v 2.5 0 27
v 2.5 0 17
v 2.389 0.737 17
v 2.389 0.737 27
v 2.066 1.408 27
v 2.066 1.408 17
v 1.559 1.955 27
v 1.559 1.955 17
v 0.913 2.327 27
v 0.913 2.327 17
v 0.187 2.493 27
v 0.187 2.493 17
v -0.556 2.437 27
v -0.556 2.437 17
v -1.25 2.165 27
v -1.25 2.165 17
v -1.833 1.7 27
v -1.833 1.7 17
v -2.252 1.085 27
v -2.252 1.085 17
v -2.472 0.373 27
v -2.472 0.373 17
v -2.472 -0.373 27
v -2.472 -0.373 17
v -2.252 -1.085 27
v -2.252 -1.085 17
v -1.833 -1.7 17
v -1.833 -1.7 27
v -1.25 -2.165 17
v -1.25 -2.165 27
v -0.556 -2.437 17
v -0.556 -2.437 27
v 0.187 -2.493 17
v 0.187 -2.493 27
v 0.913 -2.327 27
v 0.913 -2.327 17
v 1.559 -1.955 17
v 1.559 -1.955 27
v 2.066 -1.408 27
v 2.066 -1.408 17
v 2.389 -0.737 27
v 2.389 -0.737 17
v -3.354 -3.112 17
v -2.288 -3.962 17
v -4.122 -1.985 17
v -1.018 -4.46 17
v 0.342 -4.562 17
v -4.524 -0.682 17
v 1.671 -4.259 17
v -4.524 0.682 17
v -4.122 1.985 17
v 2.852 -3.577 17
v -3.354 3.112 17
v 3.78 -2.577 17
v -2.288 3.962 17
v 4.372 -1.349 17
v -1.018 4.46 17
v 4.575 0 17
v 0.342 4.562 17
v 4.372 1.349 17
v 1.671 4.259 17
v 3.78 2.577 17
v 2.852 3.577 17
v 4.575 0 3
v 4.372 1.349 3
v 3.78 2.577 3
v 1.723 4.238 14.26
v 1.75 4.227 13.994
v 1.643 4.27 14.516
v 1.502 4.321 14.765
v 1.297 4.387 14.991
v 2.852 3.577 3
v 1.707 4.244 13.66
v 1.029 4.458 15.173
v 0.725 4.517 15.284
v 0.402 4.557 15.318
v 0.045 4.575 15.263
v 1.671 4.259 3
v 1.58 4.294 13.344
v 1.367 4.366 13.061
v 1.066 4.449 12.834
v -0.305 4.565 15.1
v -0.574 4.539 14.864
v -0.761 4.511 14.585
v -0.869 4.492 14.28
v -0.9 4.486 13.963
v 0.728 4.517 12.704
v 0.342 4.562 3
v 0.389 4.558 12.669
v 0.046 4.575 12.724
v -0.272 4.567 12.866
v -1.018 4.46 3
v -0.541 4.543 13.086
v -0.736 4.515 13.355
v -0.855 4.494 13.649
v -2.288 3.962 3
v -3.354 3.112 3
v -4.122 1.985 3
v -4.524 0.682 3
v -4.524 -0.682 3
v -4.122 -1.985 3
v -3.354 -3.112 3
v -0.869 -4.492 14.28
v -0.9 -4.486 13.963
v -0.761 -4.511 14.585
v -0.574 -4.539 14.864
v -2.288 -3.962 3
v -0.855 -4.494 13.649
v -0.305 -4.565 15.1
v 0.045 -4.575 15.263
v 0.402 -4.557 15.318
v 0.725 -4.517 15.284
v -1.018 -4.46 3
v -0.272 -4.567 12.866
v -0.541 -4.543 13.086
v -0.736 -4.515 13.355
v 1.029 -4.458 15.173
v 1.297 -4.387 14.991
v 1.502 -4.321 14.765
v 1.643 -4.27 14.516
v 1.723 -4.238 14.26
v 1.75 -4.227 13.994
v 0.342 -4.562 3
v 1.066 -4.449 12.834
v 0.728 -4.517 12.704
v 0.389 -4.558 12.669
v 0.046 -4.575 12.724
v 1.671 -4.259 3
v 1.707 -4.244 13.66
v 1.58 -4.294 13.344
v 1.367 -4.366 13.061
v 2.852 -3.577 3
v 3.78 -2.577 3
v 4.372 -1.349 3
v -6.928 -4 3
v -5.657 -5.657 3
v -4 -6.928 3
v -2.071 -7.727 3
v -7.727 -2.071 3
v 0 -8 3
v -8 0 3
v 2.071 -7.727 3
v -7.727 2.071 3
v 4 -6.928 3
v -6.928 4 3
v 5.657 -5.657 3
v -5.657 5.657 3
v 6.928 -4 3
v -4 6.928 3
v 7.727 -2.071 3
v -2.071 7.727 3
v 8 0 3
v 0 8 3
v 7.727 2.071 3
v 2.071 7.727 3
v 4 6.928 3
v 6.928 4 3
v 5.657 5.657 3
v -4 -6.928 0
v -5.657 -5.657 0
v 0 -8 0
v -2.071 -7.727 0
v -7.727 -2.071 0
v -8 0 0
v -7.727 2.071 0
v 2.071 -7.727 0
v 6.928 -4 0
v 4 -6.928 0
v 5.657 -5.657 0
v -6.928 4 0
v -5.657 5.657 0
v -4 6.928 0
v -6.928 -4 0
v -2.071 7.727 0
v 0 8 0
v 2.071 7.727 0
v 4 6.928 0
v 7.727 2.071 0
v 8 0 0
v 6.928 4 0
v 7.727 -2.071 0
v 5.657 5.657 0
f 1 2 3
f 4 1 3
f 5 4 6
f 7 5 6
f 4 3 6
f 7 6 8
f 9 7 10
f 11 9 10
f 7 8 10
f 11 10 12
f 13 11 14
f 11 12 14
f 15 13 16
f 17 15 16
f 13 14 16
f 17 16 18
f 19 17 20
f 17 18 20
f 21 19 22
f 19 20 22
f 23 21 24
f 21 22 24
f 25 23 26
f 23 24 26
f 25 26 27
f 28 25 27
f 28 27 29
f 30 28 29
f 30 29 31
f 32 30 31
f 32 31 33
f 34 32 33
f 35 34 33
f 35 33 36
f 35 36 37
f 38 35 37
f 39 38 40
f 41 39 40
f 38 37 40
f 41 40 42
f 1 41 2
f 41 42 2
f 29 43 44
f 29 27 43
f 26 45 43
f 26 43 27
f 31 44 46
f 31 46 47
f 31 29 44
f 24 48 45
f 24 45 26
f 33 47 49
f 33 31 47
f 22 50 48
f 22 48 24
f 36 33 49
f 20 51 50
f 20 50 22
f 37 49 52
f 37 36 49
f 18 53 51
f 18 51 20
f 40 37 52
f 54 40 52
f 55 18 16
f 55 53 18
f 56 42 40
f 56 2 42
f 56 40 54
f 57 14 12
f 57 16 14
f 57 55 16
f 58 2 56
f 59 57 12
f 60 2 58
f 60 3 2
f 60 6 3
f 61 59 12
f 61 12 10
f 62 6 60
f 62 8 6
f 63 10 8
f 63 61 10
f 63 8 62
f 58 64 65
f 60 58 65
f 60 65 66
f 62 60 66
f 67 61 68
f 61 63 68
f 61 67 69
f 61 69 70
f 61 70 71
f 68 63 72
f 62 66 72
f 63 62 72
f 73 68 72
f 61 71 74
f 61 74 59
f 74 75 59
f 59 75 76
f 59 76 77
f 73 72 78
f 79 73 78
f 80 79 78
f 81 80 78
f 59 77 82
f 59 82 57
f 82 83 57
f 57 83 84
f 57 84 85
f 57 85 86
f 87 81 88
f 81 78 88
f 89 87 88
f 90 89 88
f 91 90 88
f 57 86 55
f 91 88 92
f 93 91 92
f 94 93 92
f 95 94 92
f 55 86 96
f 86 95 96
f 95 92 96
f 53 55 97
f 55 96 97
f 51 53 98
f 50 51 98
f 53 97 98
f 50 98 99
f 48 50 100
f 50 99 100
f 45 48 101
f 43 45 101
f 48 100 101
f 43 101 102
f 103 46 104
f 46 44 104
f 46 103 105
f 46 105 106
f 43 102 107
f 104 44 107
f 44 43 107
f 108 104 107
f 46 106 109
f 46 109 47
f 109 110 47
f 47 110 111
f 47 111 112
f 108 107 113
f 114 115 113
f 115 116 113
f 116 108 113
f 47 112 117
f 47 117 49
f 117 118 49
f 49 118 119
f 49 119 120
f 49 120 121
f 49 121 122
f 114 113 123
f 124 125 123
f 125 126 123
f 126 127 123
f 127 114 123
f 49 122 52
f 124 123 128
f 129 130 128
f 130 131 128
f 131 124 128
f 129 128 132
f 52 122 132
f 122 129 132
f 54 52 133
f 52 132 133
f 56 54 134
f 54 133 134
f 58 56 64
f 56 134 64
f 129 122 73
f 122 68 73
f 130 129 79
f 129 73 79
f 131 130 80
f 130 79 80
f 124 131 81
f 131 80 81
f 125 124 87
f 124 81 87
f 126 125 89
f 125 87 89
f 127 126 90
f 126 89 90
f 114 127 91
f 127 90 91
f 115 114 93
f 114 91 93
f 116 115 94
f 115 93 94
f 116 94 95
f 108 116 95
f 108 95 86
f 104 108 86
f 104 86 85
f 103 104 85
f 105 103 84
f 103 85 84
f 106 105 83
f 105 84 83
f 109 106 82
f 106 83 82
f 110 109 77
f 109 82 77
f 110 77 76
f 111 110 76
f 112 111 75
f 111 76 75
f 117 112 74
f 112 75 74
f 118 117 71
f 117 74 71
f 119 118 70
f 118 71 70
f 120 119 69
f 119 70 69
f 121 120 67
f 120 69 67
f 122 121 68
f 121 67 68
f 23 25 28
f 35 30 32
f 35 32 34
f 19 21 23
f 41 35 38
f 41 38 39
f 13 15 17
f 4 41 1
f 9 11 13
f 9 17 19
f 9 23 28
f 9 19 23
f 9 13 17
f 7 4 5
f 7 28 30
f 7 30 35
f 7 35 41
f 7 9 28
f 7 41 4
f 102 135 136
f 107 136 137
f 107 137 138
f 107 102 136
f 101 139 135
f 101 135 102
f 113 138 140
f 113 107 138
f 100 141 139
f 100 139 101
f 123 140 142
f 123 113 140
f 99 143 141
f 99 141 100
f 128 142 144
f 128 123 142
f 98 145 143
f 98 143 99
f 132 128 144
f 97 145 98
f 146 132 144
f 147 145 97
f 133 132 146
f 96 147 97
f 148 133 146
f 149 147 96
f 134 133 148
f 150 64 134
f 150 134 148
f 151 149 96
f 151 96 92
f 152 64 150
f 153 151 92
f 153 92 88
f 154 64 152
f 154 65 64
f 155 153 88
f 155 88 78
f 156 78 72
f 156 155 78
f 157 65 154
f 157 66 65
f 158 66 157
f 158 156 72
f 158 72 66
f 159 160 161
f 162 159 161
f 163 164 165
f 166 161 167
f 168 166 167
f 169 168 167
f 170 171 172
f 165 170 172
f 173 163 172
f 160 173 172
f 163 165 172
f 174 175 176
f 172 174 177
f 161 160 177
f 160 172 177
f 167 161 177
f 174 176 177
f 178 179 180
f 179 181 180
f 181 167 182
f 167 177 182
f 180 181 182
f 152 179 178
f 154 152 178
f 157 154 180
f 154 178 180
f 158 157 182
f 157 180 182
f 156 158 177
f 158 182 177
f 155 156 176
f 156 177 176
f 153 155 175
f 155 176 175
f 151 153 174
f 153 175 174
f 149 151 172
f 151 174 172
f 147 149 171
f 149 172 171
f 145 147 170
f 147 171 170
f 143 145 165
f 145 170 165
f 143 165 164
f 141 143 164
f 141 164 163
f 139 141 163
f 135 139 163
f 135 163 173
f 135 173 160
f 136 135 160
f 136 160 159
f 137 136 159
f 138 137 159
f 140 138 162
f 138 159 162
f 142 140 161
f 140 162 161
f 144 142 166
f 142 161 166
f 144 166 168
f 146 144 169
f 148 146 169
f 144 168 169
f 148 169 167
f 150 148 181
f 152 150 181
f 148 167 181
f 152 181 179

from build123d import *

# Parameters (mm, degrees)
SKETCH1_R           = 8
BOSS_EXTRUDE1_DEPTH = 3
SKETCH2_R           = 4.575
BOSS_EXTRUDE2_DEPTH = 14
SKETCH3_R           = 2.5
BOSS_EXTRUDE3_DEPTH = 10
SKETCH4_R           = 1.325
CUT_EXTRUDE1_DEPTH  = 7.5


with BuildPart() as part:
    # Sketch1 → Boss-Extrude1 (new body)
    with BuildSketch(Plane.XY):
        Circle(SKETCH1_R)
    extrude(amount=BOSS_EXTRUDE1_DEPTH)

    # Sketch2 → Boss-Extrude2 (add)
    with BuildSketch(Plane.XY.offset(3)):
        Circle(SKETCH2_R)
    extrude(amount=BOSS_EXTRUDE2_DEPTH)

    # Sketch3 → Boss-Extrude3 (add)
    with BuildSketch(Plane.XY.offset(17)):
        Circle(SKETCH3_R)
    extrude(amount=BOSS_EXTRUDE3_DEPTH)

    # Sketch4 → Cut-Extrude1 (cut, symmetric)
    with BuildSketch(Plane(origin=(0, 0, 0), x_dir=(1, 0, 0), z_dir=(0, 1, 0))):
        with Locations((0.425, -13.99354762)):
            Circle(SKETCH4_R)
    extrude(amount=CUT_EXTRUDE1_DEPTH, both=True, mode=Mode.SUBTRACT)


solid = part.part
